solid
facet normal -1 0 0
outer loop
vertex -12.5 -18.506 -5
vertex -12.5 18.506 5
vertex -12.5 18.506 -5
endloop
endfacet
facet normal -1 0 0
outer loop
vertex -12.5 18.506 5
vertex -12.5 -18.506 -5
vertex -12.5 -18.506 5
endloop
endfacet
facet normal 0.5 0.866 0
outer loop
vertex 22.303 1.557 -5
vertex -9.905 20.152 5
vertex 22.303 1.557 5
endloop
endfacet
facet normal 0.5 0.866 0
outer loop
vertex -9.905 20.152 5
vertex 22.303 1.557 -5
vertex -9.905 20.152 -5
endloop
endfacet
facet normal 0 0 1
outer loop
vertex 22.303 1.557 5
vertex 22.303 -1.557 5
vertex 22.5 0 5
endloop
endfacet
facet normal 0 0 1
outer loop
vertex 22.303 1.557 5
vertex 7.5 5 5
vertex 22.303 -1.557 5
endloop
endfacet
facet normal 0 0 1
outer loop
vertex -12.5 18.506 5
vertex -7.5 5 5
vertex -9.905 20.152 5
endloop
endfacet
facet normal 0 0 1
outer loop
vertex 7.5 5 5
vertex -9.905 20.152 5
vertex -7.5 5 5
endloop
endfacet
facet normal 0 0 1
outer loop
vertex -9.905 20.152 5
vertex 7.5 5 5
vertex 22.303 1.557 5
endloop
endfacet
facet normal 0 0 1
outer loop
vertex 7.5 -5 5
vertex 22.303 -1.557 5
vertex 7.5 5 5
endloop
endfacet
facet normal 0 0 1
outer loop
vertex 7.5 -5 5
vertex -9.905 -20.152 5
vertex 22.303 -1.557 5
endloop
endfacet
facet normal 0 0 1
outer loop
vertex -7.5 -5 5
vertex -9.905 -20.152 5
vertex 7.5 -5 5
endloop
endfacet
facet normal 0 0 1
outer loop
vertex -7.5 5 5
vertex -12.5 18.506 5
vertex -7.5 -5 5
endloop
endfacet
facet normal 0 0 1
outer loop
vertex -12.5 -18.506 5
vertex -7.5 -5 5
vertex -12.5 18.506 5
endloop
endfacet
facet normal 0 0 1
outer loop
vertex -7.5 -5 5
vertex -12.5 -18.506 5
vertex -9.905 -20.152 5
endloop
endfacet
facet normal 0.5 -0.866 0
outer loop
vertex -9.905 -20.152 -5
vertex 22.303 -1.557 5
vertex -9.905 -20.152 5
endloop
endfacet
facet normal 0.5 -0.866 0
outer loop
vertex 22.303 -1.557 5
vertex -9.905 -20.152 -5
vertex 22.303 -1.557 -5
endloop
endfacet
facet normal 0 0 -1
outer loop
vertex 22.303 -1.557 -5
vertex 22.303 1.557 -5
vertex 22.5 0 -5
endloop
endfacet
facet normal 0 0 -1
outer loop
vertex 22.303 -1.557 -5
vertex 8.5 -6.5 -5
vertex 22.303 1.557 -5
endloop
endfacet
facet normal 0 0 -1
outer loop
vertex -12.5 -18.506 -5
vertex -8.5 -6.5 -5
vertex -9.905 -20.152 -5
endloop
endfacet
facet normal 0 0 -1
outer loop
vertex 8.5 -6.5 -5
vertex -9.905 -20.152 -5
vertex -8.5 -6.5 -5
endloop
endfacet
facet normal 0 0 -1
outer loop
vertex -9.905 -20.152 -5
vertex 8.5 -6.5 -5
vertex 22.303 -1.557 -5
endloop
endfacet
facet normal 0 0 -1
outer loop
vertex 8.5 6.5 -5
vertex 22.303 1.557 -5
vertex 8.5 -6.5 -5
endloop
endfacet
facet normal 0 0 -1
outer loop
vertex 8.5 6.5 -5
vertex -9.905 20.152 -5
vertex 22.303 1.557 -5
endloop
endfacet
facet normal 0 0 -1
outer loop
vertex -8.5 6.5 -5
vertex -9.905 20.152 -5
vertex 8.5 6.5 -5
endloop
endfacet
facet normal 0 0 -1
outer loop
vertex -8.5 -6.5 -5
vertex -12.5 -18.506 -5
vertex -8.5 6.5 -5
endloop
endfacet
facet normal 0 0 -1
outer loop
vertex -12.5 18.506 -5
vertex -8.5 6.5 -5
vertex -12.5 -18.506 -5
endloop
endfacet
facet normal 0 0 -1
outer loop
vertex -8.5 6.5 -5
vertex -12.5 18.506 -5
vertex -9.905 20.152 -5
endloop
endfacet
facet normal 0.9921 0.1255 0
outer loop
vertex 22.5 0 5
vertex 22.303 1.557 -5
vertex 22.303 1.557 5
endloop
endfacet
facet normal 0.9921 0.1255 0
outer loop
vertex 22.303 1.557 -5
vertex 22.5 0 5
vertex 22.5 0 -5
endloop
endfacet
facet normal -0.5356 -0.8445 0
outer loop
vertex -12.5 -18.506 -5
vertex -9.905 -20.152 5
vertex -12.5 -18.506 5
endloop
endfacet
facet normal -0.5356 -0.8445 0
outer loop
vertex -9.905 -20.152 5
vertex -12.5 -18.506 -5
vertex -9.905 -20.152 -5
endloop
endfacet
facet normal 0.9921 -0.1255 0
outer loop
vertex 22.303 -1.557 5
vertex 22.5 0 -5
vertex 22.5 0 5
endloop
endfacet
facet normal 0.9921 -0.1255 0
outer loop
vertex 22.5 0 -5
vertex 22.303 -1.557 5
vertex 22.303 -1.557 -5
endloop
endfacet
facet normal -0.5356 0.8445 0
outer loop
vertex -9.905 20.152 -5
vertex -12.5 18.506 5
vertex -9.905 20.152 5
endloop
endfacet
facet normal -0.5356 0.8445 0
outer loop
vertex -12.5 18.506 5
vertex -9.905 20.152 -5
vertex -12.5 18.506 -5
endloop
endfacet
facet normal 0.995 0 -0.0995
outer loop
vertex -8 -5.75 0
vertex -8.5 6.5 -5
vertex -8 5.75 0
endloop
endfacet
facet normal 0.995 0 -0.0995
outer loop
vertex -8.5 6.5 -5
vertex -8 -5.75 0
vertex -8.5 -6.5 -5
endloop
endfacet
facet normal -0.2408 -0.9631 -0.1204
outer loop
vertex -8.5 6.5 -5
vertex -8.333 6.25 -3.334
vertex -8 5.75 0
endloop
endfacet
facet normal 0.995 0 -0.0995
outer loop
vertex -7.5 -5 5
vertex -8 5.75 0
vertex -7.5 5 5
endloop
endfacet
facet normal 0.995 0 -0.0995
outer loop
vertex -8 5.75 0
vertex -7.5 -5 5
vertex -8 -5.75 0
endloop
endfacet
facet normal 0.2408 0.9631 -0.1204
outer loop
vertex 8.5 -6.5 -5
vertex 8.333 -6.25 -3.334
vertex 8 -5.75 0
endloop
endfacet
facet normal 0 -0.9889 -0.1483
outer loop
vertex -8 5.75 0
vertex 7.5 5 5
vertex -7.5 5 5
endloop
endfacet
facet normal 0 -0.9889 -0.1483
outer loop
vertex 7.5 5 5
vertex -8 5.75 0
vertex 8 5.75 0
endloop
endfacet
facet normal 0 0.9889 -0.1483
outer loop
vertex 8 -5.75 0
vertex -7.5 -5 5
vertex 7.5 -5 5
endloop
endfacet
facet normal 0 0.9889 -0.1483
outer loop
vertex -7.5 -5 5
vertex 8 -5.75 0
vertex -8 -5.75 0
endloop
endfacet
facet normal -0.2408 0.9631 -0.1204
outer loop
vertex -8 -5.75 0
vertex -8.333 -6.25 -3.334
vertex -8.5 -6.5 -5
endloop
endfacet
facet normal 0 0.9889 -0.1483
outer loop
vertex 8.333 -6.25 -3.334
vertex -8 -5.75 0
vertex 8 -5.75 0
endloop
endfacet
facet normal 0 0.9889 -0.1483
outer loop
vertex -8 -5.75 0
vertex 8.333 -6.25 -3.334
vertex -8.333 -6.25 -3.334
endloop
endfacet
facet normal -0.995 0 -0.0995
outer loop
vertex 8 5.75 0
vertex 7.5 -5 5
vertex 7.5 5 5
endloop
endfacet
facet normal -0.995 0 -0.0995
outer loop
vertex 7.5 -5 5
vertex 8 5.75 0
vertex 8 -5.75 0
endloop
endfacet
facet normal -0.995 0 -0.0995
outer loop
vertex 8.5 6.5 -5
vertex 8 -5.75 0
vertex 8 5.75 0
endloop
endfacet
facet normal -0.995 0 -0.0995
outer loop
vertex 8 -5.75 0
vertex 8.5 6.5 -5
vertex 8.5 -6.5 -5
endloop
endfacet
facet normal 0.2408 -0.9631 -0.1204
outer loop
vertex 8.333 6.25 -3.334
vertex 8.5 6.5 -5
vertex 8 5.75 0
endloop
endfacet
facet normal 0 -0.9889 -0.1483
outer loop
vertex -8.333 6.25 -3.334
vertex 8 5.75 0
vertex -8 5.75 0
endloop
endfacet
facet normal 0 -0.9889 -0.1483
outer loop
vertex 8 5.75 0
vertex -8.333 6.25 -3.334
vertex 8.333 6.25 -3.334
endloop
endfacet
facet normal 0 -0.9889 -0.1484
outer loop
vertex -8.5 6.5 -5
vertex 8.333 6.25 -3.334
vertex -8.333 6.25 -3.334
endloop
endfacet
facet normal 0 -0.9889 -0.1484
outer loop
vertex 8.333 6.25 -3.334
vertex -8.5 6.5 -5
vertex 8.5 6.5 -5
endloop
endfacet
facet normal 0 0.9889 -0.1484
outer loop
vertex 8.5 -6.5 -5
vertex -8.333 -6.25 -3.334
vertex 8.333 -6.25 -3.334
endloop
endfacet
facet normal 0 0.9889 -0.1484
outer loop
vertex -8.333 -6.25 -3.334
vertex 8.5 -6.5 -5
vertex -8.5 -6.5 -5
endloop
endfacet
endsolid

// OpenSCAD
// file: tap_params.scad
// tap_params.scad

GRIP_DIAMETER  = 50;
INNER_TOP_XY    = [15, 10];
INNER_BOTTOM_XY = [17, 13];
HEIGHT          = 10;

GRIP_NUM_SIDES  = 3;

EPS = 0.0001;
// main file
// tap_body.scad

include <tap_params.scad>

module TapBody()  {
  difference()  {
    intersection() {
      cylinder(h = HEIGHT,  d = GRIP_DIAMETER,  center=true,
             $fn = GRIP_NUM_SIDES);
      cylinder(h = HEIGHT,  d = 0.9*GRIP_DIAMETER,  center=true,
             $fn = 25);
    }

    _scaleXY  = [INNER_TOP_XY.x / INNER_BOTTOM_XY.x,
                 INNER_TOP_XY.y / INNER_BOTTOM_XY.y];
    translate([0, 0, -2*EPS])
    linear_extrude(height = HEIGHT+10*EPS, center = true, scale = _scaleXY)
    square(size = INNER_BOTTOM_XY, center = true);
  }
}//_END_OF__module_TapBody

TapBody();
